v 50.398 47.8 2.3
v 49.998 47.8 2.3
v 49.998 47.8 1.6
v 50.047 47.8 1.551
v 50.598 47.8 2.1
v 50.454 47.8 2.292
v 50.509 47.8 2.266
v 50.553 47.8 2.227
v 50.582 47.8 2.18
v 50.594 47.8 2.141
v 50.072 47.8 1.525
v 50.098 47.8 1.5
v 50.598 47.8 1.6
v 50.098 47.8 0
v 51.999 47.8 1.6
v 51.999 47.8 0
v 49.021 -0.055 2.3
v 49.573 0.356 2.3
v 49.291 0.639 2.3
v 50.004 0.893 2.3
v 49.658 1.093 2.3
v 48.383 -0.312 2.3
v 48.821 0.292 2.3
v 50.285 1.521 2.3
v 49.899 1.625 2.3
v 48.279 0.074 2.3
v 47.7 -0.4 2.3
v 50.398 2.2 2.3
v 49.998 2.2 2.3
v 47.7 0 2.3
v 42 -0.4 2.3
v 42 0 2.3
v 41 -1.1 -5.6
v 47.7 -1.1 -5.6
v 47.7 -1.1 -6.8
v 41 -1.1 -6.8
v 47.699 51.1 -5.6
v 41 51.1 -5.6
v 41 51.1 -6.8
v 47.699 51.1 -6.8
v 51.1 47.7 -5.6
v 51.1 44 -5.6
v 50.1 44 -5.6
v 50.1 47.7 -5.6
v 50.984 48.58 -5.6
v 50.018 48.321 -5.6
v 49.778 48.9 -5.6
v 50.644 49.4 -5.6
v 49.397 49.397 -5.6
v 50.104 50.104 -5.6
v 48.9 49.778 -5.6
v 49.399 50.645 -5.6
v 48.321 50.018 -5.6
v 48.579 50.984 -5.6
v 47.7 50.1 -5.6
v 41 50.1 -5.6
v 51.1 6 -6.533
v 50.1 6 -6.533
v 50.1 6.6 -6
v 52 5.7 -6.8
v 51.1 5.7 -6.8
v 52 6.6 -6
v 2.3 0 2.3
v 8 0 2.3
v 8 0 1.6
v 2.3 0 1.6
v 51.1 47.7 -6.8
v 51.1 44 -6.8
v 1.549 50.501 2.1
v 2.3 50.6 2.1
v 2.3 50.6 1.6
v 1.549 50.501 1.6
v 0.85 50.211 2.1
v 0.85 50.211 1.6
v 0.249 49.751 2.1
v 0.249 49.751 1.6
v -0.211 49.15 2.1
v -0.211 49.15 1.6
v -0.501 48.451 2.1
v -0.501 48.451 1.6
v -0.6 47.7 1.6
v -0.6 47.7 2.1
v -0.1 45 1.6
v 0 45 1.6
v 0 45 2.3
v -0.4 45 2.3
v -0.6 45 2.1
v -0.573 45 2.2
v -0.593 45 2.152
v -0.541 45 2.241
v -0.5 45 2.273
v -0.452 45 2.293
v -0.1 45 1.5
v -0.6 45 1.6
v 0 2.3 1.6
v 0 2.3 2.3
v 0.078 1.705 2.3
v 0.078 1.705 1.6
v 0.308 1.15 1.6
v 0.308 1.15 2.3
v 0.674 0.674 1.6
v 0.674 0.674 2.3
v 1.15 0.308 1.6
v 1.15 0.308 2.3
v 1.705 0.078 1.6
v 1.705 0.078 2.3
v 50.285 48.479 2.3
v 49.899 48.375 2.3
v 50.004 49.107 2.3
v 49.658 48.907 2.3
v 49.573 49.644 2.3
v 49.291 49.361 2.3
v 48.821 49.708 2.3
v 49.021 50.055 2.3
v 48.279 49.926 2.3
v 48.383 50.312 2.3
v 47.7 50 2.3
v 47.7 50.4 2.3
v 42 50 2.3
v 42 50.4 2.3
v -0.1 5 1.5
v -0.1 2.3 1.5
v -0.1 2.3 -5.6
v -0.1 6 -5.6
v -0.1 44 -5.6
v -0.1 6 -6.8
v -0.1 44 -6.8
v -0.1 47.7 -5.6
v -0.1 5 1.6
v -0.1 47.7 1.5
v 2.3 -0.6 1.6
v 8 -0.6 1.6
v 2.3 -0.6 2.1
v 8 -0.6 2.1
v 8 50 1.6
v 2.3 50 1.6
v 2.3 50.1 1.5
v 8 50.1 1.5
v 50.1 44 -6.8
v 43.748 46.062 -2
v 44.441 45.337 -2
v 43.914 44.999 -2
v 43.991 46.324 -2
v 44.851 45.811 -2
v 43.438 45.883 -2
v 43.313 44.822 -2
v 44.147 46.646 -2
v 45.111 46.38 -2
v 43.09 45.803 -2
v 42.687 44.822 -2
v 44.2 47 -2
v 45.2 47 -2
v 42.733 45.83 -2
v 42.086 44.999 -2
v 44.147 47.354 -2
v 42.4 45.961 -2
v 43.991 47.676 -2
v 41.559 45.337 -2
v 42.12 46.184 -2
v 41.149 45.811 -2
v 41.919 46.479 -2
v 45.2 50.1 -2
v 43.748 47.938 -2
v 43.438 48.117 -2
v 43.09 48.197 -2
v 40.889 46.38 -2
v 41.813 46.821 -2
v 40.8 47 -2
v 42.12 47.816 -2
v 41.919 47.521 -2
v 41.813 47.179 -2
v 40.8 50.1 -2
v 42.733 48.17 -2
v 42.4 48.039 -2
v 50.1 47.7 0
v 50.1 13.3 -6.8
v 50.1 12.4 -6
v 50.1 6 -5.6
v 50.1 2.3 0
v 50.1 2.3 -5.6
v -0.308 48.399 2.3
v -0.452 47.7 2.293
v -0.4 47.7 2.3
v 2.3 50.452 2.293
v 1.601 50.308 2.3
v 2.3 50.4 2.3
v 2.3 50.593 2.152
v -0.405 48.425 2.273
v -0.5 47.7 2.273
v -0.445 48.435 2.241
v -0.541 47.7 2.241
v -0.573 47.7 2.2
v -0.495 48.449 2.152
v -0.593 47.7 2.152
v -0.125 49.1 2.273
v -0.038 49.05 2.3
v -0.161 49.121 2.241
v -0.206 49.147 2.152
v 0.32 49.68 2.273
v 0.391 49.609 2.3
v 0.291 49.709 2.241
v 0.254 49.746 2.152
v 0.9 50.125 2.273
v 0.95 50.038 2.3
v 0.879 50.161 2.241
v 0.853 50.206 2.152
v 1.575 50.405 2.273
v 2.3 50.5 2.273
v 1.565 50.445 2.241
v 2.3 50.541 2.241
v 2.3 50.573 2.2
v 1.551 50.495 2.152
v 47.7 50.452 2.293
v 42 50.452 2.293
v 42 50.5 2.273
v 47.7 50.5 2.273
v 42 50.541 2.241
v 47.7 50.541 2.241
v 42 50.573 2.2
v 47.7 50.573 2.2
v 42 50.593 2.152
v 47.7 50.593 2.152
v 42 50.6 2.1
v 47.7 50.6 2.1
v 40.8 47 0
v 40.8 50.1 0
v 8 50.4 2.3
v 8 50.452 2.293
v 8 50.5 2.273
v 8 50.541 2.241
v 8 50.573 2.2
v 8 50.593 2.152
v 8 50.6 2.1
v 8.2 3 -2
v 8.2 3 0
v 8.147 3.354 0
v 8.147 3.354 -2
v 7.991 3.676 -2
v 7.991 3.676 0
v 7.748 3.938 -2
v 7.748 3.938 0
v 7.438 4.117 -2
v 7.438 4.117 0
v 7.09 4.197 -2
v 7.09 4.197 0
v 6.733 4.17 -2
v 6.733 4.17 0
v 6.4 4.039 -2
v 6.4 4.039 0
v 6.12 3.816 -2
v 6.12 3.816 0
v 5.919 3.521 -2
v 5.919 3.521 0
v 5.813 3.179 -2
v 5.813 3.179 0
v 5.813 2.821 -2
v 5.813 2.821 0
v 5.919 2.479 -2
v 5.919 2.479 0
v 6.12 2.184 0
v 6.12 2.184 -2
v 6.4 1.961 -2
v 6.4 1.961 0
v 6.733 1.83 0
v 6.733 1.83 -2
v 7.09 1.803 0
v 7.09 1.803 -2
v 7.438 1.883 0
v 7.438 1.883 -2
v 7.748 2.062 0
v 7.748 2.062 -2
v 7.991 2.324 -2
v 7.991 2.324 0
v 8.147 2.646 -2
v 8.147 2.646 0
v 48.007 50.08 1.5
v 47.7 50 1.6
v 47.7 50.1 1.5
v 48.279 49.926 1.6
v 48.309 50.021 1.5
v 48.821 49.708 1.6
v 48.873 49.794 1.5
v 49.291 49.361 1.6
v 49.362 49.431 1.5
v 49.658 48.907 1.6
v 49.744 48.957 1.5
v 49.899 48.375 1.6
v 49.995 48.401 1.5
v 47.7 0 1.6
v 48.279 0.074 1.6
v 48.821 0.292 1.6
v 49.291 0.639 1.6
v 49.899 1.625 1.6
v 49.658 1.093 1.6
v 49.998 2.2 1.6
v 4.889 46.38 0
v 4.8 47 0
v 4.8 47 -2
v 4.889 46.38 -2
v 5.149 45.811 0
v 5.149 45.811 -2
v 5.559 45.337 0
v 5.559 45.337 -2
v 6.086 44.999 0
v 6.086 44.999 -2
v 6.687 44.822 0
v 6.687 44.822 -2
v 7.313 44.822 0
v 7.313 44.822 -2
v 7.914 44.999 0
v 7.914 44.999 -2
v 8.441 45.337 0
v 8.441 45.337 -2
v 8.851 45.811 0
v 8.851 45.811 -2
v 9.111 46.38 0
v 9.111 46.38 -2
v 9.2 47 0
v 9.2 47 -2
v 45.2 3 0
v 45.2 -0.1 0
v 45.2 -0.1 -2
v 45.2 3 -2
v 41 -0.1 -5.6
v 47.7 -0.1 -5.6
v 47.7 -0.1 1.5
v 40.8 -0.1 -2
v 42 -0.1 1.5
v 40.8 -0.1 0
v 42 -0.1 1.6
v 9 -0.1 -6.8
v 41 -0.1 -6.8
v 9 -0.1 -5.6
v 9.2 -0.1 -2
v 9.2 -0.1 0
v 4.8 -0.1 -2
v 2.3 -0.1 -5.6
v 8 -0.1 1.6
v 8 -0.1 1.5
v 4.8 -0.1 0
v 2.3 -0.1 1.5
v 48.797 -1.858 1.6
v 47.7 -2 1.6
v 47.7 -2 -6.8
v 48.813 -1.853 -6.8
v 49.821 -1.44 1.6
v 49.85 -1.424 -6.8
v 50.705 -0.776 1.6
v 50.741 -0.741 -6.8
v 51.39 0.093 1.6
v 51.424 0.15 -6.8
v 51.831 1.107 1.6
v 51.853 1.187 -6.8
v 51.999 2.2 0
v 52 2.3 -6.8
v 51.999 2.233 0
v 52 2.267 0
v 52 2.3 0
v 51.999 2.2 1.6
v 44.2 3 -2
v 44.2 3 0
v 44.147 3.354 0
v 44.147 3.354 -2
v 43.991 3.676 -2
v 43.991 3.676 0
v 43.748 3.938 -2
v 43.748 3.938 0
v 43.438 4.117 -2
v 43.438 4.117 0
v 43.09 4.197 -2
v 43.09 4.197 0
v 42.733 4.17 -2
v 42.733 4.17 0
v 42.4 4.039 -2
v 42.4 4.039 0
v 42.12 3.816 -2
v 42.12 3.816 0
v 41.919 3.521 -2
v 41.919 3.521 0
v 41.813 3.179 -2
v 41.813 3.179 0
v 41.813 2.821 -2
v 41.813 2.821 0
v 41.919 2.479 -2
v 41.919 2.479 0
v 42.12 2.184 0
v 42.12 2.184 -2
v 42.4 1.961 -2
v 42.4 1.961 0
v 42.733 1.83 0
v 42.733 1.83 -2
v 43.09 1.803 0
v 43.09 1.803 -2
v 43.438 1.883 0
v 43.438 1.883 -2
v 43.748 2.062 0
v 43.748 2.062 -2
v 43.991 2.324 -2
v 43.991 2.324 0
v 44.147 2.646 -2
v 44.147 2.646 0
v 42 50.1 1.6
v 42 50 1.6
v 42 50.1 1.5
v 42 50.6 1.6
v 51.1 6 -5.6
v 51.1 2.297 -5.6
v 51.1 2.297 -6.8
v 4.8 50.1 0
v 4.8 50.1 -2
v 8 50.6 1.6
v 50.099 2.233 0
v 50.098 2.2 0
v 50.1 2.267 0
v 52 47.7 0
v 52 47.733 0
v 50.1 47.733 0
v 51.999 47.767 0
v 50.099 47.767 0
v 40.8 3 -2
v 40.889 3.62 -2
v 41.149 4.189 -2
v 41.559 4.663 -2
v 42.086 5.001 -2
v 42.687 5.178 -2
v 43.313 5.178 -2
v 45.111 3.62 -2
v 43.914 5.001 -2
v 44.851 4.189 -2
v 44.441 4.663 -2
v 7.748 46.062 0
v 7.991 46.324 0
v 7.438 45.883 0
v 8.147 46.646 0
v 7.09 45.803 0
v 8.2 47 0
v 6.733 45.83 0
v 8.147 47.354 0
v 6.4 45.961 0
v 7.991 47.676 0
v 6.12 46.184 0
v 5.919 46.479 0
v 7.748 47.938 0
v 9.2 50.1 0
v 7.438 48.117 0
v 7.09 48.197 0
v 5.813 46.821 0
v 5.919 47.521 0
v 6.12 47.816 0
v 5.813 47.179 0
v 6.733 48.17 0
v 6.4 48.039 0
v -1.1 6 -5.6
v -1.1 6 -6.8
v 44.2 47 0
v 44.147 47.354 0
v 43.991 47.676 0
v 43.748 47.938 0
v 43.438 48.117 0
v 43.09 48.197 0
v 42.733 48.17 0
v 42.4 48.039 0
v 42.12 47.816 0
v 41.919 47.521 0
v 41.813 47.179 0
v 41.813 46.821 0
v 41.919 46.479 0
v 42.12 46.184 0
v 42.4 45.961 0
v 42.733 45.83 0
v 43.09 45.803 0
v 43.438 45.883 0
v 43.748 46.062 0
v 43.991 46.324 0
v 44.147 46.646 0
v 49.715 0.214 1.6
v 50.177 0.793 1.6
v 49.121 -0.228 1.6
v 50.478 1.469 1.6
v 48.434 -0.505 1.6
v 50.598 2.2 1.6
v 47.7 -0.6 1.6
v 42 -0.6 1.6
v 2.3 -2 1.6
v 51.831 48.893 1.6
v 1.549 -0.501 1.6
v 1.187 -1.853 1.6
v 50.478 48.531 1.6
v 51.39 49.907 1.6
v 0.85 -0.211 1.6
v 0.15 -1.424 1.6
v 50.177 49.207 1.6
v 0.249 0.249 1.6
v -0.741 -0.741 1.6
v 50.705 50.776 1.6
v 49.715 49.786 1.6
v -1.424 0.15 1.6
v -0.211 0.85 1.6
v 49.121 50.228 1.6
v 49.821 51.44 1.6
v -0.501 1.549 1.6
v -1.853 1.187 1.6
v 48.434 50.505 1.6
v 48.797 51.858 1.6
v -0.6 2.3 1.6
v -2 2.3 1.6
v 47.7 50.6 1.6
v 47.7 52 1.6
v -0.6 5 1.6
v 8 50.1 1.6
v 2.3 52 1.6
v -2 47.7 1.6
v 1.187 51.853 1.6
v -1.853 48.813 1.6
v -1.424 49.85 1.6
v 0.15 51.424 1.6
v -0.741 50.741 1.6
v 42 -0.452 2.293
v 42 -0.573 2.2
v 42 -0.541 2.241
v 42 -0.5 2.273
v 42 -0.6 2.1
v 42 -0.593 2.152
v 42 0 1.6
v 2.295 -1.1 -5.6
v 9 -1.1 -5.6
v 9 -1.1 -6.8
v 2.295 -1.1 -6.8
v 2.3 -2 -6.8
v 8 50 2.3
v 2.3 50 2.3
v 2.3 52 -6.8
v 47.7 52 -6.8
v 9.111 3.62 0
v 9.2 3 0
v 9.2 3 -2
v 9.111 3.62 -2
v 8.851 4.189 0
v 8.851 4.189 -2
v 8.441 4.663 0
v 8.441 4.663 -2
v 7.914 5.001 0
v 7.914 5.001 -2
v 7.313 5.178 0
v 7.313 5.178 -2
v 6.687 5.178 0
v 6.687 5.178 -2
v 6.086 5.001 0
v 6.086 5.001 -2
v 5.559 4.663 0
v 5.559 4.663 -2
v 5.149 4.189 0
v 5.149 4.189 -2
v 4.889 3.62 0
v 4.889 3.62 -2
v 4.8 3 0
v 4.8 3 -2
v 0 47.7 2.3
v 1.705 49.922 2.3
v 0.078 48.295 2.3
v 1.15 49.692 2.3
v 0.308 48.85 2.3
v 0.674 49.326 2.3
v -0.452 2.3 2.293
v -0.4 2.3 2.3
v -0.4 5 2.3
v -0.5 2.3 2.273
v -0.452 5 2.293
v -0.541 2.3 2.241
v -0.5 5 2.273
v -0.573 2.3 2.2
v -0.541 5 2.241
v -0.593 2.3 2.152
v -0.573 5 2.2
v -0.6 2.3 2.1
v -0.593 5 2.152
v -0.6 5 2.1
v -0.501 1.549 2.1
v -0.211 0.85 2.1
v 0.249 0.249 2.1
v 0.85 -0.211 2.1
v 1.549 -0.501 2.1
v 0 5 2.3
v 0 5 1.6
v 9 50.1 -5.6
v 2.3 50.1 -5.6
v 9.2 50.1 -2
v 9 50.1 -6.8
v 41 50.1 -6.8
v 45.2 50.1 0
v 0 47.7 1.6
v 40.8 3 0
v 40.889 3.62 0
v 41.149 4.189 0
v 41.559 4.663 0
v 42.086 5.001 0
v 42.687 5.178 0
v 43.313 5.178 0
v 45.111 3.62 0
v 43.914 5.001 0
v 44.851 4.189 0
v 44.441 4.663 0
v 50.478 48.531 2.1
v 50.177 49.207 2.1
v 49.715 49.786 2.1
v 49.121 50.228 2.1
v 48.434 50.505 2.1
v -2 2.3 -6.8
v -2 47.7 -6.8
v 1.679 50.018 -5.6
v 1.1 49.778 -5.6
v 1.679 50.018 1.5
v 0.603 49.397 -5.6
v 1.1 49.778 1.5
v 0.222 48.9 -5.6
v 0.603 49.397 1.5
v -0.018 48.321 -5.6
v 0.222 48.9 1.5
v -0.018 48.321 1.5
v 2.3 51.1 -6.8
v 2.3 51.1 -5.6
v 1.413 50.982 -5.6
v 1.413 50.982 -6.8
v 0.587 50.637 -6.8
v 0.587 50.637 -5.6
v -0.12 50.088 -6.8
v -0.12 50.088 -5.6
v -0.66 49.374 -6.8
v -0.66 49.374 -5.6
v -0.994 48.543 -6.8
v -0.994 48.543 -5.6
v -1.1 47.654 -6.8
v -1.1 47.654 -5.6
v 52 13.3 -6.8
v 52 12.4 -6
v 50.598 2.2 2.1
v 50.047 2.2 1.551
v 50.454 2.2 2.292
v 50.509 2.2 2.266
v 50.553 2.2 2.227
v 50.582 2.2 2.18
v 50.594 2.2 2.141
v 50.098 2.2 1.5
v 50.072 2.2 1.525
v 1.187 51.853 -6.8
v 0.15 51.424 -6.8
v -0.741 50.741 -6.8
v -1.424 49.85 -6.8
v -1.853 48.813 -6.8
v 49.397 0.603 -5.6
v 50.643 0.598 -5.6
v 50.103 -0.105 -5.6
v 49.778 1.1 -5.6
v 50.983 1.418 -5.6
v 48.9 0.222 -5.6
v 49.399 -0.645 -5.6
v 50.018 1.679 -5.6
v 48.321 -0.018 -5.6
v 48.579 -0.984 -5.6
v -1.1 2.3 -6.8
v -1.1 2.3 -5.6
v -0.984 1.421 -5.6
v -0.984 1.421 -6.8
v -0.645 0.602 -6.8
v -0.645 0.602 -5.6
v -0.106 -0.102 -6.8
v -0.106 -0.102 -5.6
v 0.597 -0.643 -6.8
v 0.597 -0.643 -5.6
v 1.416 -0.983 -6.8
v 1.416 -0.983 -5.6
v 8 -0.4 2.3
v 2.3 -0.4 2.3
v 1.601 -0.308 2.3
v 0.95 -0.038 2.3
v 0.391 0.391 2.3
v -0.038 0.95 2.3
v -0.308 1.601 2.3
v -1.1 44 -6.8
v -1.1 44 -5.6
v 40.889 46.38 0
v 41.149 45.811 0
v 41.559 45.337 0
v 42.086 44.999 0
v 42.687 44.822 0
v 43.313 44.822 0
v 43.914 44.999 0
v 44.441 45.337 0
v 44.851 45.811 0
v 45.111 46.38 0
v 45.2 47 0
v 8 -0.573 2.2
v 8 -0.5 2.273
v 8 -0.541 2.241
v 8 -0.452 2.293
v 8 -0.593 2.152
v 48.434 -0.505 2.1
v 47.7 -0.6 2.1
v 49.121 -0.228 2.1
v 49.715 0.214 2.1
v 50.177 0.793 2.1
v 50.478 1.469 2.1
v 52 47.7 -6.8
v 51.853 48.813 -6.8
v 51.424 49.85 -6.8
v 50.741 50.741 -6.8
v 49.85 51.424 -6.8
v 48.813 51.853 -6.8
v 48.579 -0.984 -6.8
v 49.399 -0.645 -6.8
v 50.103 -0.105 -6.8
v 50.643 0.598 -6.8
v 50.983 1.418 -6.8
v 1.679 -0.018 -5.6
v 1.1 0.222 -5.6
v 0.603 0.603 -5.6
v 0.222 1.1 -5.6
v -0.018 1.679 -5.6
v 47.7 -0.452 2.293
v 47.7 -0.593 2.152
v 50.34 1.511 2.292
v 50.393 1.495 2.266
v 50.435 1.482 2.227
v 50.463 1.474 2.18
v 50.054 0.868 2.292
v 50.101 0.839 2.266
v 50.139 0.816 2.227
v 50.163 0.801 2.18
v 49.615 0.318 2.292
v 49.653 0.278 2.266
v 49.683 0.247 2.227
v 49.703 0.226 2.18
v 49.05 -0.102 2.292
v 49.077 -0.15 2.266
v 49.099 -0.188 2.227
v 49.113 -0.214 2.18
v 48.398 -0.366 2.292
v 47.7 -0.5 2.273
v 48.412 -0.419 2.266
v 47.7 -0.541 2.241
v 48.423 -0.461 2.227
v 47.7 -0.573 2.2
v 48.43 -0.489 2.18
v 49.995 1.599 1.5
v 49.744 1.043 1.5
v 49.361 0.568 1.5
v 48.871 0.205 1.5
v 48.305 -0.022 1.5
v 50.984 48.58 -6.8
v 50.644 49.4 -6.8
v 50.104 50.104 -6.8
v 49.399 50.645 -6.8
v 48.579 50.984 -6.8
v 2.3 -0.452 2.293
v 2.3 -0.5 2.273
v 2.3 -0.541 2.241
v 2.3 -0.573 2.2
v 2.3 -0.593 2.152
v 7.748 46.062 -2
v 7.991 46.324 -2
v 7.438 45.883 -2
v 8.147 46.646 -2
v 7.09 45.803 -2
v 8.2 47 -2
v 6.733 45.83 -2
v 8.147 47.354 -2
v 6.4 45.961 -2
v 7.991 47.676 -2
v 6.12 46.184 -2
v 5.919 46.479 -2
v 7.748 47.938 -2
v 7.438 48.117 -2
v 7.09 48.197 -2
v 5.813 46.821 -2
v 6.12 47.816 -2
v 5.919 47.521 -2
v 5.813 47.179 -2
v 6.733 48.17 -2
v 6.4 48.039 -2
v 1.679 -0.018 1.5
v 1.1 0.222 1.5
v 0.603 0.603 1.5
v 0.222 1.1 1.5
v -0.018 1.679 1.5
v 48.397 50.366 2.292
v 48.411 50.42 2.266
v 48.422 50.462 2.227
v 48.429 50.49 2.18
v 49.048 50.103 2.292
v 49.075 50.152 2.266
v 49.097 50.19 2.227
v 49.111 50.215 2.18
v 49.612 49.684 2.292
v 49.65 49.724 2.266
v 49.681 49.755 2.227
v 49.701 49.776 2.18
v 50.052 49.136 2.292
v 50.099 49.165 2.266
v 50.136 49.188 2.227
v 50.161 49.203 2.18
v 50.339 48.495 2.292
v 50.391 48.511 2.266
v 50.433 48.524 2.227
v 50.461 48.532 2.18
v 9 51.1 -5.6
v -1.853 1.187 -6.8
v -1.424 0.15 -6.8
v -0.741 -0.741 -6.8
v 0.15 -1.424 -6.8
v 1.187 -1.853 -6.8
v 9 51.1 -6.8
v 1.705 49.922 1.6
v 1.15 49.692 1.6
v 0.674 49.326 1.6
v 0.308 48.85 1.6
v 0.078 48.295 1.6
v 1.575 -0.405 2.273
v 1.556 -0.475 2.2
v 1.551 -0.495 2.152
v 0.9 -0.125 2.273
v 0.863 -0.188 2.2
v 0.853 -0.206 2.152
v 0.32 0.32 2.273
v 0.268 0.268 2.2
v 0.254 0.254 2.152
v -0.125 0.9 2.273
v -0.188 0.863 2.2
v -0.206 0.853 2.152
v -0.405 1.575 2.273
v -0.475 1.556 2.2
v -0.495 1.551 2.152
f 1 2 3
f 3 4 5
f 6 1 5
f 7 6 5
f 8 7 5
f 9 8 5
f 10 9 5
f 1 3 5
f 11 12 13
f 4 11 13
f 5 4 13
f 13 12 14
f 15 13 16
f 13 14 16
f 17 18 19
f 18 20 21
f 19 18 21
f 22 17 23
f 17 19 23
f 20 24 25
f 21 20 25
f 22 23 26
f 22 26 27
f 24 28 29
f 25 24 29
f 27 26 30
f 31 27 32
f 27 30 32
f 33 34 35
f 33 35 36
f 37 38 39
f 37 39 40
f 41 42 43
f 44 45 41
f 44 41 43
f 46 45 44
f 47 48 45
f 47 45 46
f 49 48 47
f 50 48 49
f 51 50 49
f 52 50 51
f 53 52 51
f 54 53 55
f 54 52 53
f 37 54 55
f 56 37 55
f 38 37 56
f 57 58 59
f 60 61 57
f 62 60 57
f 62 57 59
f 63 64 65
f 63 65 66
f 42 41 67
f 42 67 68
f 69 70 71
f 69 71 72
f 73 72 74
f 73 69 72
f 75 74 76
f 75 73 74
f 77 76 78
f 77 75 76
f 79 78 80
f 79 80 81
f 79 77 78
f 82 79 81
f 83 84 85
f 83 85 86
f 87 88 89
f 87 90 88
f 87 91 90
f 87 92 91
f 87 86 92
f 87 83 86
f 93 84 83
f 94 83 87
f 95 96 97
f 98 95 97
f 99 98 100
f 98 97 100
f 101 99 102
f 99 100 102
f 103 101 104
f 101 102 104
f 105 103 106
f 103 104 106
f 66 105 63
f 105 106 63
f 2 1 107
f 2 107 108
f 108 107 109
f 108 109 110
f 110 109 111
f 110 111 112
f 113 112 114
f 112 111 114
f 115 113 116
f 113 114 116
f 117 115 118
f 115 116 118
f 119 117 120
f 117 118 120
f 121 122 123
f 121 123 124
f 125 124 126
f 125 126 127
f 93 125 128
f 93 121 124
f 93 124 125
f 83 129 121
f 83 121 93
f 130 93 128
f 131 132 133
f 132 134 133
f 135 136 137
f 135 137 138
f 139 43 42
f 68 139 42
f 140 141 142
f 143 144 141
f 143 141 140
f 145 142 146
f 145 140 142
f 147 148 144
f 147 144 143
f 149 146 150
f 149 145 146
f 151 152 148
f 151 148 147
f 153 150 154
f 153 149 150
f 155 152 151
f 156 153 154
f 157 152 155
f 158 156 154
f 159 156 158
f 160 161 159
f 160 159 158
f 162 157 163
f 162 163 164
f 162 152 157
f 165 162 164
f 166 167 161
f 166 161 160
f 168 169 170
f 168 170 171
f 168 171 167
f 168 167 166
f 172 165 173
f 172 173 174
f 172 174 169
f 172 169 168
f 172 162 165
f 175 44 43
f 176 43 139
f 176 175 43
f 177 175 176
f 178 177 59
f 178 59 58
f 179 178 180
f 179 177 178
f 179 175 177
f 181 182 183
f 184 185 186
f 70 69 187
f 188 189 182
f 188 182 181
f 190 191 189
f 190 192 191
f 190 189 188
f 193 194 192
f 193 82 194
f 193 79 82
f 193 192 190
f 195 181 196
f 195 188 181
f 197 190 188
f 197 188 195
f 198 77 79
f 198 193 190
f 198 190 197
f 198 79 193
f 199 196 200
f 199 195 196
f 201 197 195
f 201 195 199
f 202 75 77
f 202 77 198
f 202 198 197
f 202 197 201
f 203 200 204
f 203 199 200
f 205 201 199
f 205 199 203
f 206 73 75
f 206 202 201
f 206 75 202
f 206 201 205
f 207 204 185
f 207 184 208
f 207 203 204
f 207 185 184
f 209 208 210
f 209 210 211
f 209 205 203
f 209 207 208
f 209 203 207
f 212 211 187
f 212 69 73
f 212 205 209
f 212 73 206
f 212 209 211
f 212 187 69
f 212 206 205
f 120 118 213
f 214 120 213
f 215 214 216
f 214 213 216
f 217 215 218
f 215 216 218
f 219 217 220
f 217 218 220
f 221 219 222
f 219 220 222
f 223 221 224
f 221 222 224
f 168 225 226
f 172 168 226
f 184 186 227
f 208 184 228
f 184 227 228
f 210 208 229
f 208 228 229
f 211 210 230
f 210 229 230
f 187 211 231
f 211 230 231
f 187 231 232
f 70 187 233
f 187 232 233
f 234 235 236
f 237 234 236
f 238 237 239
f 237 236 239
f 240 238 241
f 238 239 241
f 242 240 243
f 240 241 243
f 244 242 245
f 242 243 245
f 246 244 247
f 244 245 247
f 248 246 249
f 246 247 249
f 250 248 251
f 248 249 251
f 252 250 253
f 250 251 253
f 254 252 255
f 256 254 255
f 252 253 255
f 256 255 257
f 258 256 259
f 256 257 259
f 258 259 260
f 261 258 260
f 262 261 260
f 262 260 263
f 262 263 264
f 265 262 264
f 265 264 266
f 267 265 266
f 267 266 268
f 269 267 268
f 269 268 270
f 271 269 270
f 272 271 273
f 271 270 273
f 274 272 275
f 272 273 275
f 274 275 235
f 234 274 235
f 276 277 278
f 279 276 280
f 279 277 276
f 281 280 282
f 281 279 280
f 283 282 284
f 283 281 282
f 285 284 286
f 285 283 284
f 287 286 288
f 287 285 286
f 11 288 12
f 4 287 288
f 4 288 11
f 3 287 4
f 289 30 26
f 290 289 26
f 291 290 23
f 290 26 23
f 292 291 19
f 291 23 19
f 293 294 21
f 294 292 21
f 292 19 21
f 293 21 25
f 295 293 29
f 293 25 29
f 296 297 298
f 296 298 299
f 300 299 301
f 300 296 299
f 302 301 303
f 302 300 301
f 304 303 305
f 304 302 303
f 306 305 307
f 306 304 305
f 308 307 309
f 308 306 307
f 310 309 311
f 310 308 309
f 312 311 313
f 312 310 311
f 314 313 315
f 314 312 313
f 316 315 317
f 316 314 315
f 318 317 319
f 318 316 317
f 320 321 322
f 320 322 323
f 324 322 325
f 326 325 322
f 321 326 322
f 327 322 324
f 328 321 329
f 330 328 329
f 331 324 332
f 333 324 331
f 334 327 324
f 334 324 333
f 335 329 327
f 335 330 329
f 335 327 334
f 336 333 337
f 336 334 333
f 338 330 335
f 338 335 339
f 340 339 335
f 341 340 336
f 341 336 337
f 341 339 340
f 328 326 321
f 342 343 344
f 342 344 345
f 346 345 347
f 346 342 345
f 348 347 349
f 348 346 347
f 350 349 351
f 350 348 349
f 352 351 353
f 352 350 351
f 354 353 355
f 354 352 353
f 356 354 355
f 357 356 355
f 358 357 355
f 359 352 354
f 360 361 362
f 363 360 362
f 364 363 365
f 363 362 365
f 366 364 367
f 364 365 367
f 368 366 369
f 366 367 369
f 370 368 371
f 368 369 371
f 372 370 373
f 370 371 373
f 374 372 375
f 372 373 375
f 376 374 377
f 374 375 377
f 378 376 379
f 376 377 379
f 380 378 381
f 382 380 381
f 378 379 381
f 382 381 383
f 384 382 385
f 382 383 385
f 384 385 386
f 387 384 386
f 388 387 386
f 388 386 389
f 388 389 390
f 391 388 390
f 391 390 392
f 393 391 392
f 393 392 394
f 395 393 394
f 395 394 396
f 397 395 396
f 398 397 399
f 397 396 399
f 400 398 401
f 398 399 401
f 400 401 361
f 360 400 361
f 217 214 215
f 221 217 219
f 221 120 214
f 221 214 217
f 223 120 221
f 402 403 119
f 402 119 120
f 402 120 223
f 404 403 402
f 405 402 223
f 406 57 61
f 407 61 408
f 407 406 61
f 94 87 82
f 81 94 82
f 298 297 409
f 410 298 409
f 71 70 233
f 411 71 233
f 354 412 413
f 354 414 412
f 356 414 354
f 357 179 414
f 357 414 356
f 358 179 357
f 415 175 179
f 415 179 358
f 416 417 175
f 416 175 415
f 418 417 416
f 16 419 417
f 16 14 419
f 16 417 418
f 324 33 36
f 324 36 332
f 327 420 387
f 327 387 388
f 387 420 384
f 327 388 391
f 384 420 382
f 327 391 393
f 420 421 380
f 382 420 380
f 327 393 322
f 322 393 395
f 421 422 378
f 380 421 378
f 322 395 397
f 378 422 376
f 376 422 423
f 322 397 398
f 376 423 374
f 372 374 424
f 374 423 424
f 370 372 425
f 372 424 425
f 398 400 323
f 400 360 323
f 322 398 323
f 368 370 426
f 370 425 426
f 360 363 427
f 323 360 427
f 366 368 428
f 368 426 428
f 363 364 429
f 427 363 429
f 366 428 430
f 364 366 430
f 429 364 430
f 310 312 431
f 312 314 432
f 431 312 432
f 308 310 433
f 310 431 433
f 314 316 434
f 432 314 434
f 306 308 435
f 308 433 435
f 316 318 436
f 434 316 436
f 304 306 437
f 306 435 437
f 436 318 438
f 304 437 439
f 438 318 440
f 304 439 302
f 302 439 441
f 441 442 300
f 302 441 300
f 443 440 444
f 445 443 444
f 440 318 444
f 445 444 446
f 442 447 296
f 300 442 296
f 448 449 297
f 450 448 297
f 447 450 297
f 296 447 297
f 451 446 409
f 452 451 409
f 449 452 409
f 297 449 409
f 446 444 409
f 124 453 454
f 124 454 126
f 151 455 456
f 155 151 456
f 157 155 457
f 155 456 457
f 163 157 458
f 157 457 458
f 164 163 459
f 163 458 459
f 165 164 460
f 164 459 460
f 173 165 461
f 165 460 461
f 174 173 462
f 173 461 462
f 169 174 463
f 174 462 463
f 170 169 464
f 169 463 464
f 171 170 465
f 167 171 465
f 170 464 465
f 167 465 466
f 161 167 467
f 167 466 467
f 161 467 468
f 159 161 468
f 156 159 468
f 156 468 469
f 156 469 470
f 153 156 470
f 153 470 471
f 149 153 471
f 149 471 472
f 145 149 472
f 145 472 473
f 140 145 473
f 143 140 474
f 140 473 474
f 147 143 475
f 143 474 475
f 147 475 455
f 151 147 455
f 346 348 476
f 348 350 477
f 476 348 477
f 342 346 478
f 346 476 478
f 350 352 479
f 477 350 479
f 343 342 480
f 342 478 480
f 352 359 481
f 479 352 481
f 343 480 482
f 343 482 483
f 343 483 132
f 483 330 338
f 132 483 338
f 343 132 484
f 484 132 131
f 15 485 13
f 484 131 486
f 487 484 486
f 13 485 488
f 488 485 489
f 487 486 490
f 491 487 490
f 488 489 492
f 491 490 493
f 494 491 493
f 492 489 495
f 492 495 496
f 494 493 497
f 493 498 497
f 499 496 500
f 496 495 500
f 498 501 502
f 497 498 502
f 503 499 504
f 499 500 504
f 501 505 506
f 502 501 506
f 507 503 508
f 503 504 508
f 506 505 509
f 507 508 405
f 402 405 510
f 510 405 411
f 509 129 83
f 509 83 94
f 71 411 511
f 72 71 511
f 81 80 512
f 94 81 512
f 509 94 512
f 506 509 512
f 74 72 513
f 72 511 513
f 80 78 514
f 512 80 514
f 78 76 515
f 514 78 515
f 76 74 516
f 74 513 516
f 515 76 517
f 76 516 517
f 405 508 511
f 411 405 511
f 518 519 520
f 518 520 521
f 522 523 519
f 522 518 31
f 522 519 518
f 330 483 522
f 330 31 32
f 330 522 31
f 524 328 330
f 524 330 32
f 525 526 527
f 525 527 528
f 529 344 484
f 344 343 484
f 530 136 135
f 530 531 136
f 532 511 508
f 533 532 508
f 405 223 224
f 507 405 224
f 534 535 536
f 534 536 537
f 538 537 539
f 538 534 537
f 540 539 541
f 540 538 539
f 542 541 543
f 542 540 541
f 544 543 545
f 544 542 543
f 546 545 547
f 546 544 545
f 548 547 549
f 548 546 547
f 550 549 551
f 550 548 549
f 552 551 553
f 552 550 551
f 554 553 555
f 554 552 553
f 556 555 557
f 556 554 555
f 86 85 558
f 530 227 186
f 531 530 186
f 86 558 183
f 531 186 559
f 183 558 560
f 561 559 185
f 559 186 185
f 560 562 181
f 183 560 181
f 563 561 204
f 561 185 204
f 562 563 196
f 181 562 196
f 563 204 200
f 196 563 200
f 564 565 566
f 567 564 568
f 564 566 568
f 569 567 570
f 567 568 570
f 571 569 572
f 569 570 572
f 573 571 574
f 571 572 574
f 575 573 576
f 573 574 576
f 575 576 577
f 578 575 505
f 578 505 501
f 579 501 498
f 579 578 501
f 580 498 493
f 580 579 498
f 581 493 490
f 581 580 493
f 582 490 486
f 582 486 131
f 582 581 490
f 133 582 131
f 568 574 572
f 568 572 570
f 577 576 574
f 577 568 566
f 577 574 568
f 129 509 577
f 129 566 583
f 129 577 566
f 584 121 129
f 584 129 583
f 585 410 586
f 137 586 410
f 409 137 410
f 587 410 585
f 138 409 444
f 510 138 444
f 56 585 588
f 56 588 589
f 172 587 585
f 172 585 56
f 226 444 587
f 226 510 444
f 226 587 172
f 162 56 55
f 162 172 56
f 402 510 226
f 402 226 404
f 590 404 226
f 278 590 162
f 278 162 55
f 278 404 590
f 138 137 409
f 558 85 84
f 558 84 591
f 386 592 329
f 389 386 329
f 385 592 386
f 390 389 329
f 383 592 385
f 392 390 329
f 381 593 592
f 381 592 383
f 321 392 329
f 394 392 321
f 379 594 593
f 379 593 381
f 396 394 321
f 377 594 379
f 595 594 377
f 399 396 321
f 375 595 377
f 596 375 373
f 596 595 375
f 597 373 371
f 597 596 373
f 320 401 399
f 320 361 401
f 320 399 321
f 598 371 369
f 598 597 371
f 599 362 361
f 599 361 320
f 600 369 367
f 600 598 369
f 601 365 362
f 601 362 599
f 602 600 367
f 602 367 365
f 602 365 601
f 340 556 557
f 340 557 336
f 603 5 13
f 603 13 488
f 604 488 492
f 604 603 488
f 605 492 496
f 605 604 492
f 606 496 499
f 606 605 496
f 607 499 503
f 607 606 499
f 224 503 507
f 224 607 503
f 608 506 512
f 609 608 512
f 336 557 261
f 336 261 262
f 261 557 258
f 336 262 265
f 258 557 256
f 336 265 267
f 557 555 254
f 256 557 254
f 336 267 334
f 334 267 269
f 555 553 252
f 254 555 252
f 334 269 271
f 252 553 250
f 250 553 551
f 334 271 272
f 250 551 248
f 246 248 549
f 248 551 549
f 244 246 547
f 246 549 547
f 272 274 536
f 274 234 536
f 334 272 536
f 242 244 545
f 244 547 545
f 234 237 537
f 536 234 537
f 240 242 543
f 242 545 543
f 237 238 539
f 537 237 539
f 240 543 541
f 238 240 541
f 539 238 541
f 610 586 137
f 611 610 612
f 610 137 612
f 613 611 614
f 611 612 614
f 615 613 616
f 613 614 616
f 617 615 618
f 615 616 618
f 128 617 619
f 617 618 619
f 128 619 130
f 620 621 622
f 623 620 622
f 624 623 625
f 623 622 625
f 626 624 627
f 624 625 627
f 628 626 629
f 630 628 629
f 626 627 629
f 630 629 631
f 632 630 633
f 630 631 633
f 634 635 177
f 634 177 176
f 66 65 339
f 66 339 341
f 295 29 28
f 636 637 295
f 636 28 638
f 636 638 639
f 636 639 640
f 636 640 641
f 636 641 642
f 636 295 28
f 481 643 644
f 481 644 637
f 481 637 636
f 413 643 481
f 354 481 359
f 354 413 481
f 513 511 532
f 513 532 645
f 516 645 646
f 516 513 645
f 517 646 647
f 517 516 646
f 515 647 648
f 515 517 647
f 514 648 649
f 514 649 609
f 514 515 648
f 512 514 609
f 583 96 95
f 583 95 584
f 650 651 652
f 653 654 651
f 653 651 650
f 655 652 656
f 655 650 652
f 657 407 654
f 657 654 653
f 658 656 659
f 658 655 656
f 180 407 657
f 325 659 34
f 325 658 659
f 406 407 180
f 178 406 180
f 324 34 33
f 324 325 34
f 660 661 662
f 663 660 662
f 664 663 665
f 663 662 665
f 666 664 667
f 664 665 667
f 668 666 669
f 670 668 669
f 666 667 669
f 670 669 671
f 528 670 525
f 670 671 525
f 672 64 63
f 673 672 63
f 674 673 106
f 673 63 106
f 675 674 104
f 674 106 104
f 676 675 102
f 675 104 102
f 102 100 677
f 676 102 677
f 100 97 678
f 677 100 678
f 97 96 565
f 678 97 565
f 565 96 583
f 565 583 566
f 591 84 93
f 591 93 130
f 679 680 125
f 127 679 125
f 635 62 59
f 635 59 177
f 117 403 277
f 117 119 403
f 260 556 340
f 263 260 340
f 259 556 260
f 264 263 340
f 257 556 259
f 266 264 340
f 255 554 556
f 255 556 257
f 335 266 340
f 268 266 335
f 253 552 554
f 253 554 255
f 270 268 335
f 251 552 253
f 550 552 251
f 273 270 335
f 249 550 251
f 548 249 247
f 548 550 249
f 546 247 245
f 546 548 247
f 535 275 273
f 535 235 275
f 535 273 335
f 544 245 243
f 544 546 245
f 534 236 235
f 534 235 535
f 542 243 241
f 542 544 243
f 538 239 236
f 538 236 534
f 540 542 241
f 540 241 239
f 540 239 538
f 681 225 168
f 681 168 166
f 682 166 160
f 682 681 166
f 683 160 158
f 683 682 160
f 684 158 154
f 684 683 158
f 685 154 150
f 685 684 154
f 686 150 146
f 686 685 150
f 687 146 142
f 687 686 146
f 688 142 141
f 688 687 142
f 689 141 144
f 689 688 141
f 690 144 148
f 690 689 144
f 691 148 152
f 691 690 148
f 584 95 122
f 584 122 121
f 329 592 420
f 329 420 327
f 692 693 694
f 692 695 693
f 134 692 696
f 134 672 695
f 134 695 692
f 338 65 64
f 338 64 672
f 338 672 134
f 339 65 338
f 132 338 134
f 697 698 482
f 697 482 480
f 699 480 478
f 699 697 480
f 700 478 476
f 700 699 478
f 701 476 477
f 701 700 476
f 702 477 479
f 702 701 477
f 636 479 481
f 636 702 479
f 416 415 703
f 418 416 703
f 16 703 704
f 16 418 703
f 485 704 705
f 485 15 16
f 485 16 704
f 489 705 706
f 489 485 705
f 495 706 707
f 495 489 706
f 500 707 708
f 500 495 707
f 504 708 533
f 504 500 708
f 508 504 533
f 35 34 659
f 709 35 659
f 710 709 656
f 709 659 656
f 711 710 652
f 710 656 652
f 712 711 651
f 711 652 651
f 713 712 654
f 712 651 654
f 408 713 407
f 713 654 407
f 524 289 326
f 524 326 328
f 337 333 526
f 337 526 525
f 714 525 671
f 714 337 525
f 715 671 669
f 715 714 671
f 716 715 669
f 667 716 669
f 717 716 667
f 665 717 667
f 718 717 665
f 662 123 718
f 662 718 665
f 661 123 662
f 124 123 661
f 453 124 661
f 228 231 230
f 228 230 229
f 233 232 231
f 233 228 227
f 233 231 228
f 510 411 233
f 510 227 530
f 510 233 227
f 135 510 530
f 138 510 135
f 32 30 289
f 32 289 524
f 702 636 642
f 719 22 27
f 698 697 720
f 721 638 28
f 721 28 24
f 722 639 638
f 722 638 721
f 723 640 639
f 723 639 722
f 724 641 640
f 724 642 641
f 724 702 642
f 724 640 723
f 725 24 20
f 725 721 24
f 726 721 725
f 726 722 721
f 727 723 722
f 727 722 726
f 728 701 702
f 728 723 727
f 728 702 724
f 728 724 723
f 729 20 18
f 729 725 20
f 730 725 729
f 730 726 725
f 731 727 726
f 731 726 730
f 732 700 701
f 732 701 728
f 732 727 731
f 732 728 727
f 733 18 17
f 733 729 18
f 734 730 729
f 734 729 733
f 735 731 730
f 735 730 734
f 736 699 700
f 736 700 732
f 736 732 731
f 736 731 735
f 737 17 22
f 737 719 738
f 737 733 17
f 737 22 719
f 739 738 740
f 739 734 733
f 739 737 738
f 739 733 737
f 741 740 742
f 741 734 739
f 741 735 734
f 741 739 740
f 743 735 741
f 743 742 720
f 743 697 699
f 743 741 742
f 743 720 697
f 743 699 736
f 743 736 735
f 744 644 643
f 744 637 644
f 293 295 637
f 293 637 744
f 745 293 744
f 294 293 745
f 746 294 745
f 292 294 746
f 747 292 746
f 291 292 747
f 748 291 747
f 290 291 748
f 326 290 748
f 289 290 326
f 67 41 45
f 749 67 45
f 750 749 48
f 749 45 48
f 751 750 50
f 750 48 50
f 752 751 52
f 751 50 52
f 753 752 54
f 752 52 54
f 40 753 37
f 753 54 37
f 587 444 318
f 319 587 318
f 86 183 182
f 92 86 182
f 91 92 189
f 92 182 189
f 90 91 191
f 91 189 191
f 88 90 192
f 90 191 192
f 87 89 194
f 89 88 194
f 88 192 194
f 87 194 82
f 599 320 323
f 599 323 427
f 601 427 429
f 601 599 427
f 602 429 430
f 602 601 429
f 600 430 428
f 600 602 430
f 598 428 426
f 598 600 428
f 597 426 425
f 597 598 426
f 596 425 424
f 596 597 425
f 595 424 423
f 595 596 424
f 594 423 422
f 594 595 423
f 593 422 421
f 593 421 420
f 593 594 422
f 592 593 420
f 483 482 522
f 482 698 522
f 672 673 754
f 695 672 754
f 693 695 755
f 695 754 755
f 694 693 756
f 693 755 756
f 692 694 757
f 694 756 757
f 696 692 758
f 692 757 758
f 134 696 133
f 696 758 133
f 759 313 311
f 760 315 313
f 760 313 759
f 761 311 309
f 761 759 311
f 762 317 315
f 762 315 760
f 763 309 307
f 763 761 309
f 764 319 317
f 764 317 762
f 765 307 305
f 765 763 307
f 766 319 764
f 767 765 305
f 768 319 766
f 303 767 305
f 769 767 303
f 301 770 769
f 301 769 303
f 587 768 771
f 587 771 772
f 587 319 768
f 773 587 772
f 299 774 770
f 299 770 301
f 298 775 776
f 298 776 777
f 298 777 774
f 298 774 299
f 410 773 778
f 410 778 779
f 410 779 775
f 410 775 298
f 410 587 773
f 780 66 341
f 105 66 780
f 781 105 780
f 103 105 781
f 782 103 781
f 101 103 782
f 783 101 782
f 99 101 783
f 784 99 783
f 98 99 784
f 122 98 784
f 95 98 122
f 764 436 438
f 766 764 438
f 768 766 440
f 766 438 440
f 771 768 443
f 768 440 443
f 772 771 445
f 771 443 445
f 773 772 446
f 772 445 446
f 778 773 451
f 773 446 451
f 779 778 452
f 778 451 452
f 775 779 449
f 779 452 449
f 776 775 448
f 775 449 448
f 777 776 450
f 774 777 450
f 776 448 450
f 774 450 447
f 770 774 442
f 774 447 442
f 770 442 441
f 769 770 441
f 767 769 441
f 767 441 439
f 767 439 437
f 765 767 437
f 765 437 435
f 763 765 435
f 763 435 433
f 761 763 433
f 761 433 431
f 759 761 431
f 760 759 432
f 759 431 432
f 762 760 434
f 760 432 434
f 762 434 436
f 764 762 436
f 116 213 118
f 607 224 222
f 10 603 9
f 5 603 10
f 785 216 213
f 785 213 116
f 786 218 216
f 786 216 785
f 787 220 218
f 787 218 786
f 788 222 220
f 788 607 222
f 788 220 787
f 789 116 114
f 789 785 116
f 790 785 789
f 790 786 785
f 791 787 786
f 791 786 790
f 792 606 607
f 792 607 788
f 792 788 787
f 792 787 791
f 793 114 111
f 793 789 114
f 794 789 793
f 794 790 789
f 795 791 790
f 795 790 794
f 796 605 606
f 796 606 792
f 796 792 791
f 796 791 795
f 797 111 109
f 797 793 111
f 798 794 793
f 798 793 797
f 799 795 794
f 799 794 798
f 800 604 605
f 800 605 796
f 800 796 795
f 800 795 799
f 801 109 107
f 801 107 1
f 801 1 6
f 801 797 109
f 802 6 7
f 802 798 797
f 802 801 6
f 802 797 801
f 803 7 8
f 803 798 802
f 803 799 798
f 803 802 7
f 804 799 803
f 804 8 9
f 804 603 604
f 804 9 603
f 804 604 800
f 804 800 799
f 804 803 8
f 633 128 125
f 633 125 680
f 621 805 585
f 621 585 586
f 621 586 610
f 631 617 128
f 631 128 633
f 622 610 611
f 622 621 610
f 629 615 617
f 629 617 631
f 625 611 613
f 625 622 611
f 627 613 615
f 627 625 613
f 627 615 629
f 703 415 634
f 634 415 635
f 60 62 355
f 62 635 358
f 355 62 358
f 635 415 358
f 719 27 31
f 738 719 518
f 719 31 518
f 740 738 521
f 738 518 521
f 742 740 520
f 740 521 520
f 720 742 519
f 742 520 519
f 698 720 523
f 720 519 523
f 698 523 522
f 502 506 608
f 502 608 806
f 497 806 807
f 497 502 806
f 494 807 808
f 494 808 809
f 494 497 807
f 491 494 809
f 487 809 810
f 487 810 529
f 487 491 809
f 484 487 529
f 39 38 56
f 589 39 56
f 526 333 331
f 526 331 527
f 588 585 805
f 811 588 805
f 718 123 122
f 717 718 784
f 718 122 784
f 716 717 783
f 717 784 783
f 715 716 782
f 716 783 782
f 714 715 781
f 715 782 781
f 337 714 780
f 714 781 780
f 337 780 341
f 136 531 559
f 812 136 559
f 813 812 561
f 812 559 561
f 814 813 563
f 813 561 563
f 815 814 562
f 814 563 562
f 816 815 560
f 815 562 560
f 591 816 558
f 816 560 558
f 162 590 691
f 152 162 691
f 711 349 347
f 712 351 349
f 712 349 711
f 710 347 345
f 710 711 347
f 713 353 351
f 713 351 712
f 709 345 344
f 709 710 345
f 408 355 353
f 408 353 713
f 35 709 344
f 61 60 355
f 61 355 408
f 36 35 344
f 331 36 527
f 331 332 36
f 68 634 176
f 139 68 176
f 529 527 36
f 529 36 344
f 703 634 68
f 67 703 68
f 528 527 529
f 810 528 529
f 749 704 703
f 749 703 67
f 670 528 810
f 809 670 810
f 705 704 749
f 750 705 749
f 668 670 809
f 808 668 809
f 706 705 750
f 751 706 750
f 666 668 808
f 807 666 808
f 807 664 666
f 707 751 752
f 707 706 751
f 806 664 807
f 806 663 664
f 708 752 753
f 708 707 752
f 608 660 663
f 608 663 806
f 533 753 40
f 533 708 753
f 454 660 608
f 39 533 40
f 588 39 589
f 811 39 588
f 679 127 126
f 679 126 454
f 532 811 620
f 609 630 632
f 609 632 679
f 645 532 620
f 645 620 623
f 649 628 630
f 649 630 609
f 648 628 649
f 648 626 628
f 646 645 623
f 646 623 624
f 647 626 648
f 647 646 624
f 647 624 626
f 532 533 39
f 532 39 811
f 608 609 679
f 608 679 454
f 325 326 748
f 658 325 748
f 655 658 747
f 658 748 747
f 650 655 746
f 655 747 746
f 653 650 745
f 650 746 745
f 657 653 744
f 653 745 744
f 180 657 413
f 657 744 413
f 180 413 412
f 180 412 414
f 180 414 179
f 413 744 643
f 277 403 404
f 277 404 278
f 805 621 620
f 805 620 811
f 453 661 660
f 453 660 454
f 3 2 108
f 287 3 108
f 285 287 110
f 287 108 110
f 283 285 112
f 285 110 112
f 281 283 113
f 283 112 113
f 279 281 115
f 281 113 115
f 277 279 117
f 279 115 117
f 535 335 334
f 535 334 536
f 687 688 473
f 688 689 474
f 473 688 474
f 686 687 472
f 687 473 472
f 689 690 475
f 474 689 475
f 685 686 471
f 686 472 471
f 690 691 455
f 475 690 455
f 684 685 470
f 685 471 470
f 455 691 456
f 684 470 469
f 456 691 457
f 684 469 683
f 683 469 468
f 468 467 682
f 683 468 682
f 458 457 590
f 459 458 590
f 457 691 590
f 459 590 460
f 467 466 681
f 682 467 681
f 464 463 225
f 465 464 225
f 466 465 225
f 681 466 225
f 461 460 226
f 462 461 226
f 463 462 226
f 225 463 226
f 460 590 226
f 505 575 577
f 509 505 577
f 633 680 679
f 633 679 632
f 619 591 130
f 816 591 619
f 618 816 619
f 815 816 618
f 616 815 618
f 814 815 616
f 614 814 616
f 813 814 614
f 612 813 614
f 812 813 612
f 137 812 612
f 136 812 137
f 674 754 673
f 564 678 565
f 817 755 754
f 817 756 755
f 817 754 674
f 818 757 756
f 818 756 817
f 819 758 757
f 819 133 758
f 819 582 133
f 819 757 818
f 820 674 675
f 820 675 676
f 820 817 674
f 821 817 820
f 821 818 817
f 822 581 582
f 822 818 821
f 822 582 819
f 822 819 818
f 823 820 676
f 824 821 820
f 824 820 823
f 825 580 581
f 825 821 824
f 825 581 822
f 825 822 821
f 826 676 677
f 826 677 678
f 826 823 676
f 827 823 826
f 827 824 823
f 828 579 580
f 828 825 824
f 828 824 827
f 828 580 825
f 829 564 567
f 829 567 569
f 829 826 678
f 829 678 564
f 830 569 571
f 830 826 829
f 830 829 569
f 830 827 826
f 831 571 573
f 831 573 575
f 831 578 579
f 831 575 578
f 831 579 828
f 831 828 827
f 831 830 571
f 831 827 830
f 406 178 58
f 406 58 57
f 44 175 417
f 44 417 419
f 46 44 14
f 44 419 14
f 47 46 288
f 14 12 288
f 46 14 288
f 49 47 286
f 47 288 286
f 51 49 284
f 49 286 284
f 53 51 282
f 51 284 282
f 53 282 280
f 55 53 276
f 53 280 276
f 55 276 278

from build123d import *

# Parameters (mm, degrees)
EXTRUDE006_DEPTH                     = 2
EXTRUDE006_ONTO_SKETCH006_ROLL_ANGLE = 90
EXTRUDE006_PLACEMENT_ANGLE           = 90
SKETCH_W                             = 14.047477
SKETCH_H                             = 45.6
EXTRUDE004_DEPTH                     = 10
SKETCH002_R                          = 1.2
EXTRUDE001_DEPTH                     = 2
EXTRUDE005_DEPTH                     = 10
EXTRUDE003_DEPTH                     = 0.7
EXTRUDE003_DEPTH_BACK                = 0.2
FILLET_R                             = 0.2
CHAMFER_SIZE                         = 0.2
EXTRUDE002_DEPTH                     = 2
EXTRUDE_DEPTH                        = 1.6
EXTRUDE_DEPTH_BACK                   = 6.8


with BuildPart() as extrude006:
    # Sketch006 as drawn → Extrude006 (new, symmetric)
    with BuildSketch(Plane.XY):
        Polygon((-3.8, 0), (-2.9, 0.8), (2.9, 0.8), (3.8, 0), align=None)
    extrude(amount=EXTRUDE006_DEPTH, both=True)


with BuildPart() as extrude006_1:
    # Extrude006 onto Sketch006 roll: moved
    add(extrude006.part.rotate(Axis((0, 0, 0), (1, 0, 0)), EXTRUDE006_ONTO_SKETCH006_ROLL_ANGLE))


with BuildPart() as extrude006_2:
    # Extrude006 onto Sketch006 placement: moved
    add(extrude006_1.part)


with BuildPart() as extrude006_3:
    # Extrude006 placement: moved
    add(extrude006_2.part.moved(Location((50, 9.5, -6.8))).rotate(Axis((50, 9.5, -6.8), (0, 0, 1)), EXTRUDE006_PLACEMENT_ANGLE))


with BuildPart() as extrude004:
    # Sketch → Extrude004 (new body)
    with BuildSketch(Plane.XY):
        with Locations((51.252235, 25)):
            Rectangle(SKETCH_W, SKETCH_H)
    extrude(amount=EXTRUDE004_DEPTH)


with BuildPart() as extrude001:
    # Sketch002 → Extrude001 (new body)
    with BuildSketch(Plane.XY):
        with BuildLine():
            Line((4.8, 47), (4.8, 51))
            Line((4.8, 51), (9.2, 51))
            Line((9.2, 51), (9.2, 47.000001))
            ThreePointArc((4.8, 47), (7, 44.8), (9.2, 47.000001))
        make_face()
        with Locations((7, 47)):
            Circle(SKETCH002_R, mode=Mode.SUBTRACT)
        with BuildLine():
            ThreePointArc((9.2, 3), (7, 5.2), (4.8, 3))
            Line((4.8, 3), (4.8, -1))
            Line((4.8, -1), (9.2, -1))
            Line((9.2, -1), (9.2, 3))
        make_face()
        with Locations((7, 3)):
            Circle(SKETCH002_R, mode=Mode.SUBTRACT)
        with BuildLine():
            Line((40.8, 47), (40.8, 51))
            Line((40.8, 51), (45.2, 51))
            Line((45.2, 51), (45.2, 46.999987))
            ThreePointArc((40.8, 47), (42.999993, 44.8), (45.2, 46.999987))
        make_face()
        with Locations((43, 47)):
            Circle(SKETCH002_R, mode=Mode.SUBTRACT)
        with BuildLine():
            ThreePointArc((45.2, 3), (43, 5.2), (40.8, 3))
            Line((40.8, 3), (40.8, -1))
            Line((40.8, -1), (45.2, -1))
            Line((45.2, -1), (45.2, 3))
        make_face()
        with Locations((43, 3)):
            Circle(SKETCH002_R, mode=Mode.SUBTRACT)
    extrude(amount=-EXTRUDE001_DEPTH)


with BuildPart() as extrude005:
    # Sketch005 → Extrude005 (new body)
    with BuildSketch(Plane.XY):
        Polygon((8, 53), (8, 45), (-3, 45), (-3, 5), (8, 5), (8, -3), (42, -3), (42, 5), (53, 5), (53, 45), (42, 45), (42, 53), align=None)
    extrude(amount=EXTRUDE005_DEPTH)


with BuildPart() as cut003:
    # Sketch004 → Extrude003 (new body, two sides)
    with BuildSketch(Plane.XY) as extrude003_sk:
        with BuildLine():
            Line((2.3, 50.6), (47.7, 50.6))
            ThreePointArc((50.6, 47.7), (49.75061, 49.75061), (47.7, 50.6))
            Line((50.6, 47.7), (50.6, 2.3))
            ThreePointArc((47.7, -0.6), (49.75061, 0.24939), (50.6, 2.3))
            Line((47.7, -0.6), (2.3, -0.6))
            ThreePointArc((-0.6, 2.3), (0.24939, 0.24939), (2.3, -0.6))
            Line((-0.6, 2.3), (-0.6, 47.7))
            ThreePointArc((2.3, 50.6), (0.24939, 49.75061), (-0.6, 47.7))
        make_face()
        with BuildLine():
            Line((2.3, 50), (47.7, 50))
            ThreePointArc((50, 47.7), (49.326346, 49.326346), (47.7, 50))
            Line((50, 47.7), (50, 2.3))
            ThreePointArc((47.7, 0), (49.326346, 0.673654), (50, 2.3))
            Line((47.7, 0), (2.3, 0))
            ThreePointArc((0, 2.3), (0.673654, 0.673654), (2.3, 0))
            Line((0, 2.3), (0, 47.7))
            ThreePointArc((2.3, 50), (0.673654, 49.326346), (0, 47.7))
        make_face(mode=Mode.SUBTRACT)
    extrude(amount=EXTRUDE003_DEPTH)
    extrude(extrude003_sk.sketch, amount=-EXTRUDE003_DEPTH_BACK)


with BuildPart() as cut003_1:
    # Extrude003 placement: moved
    add(cut003.part.moved(Location((0, 0, 1.6))))

    # Fillet
    fillet_edges = [cut003_1.edges().sort_by_distance(p)[0] for p in [
        (-0.6, 25, 2.3),
        (0.24939, 49.75061, 2.3),
        (25, 50.6, 2.3),
        (49.75061, 49.75061, 2.3),
        (50.6, 25, 2.3),
        (49.75061, 0.24939, 2.3),
        (25, -0.6, 2.3),
        (0.24939, 0.24939, 2.3),
    ]]
    fillet(fillet_edges, radius=FILLET_R)

    # Chamfer
    chamfer_edges = [cut003_1.edges().sort_by_distance(p)[0] for p in [
        (0, 25, 1.4),
        (0.673654, 49.326346, 1.4),
        (25, 50, 1.4),
        (49.326346, 49.326346, 1.4),
        (50, 25, 1.4),
        (49.326346, 0.673654, 1.4),
        (25, 0, 1.4),
        (0.673654, 0.673654, 1.4),
    ]]
    chamfer(chamfer_edges, length=CHAMFER_SIZE)

    # Cut003: cut Extrude005
    add(extrude005.part, mode=Mode.SUBTRACT)


with BuildPart() as extrude002:
    # Sketch003 → Extrude002 (new body)
    with BuildSketch(Plane.XY):
        with BuildLine():
            Line((2.3, 51.1), (9, 51.1))
            Line((9, 44), (9, 51.1))
            Line((-1.1, 44), (9, 44))
            Line((-1.1, 44), (-1.1, 47.654452))
            ThreePointArc((2.3, 51.1), (-0.12032, 50.088024), (-1.1, 47.654452))
        make_face()
        with BuildLine():
            Line((51.1, 47.699699), (51.1, 44))
            Line((41, 44), (51.1, 44))
            Line((41, 51.1), (41, 44))
            Line((41, 51.1), (47.698586, 51.1))
            ThreePointArc((51.1, 47.699699), (50.103681, 50.104468), (47.698586, 51.1))
        make_face()
        with BuildLine():
            Line((47.6997, -1.1), (41, -1.1))
            Line((41, -1.1), (41, 6))
            Line((41, 6), (51.1, 6))
            Line((51.1, 6), (51.1, 2.297304))
            ThreePointArc((47.6997, -1.1), (50.103016, -0.105134), (51.1, 2.297304))
        make_face()
        with BuildLine():
            Line((-1.1, 2.300296), (-1.1, 6))
            Line((-1.1, 6), (9, 6))
            Line((9, 6), (9, -1.1))
            Line((9, -1.1), (2.294563, -1.1))
            ThreePointArc((-1.1, 2.300296), (-0.106103, -0.10205), (2.294563, -1.1))
        make_face()
    extrude(amount=-EXTRUDE002_DEPTH)


with BuildPart() as extrude002_1:
    # Extrude002 placement: moved
    add(extrude002.part.moved(Location((0, 0, -5.6))))


with BuildPart() as cut004:
    # Sketch001 → Extrude (new body, two sides)
    with BuildSketch(Plane.XY) as extrude_sk:
        with BuildLine():
            Line((2.3, 52), (47.7, 52))
            ThreePointArc((52, 47.7), (50.740559, 50.740559), (47.7, 52))
            Line((52, 47.7), (52, 2.3))
            ThreePointArc((47.7, -2), (50.740559, -0.740559), (52, 2.3))
            Line((47.7, -2), (2.3, -2))
            ThreePointArc((-2, 2.3), (-0.740559, -0.740559), (2.3, -2))
            Line((-2, 2.3), (-2, 47.7))
            ThreePointArc((2.3, 52), (-0.740559, 50.740559), (-2, 47.7))
        make_face()
        with BuildLine():
            Line((2.3, 50.1), (47.7, 50.1))
            ThreePointArc((50.1, 47.7), (49.397056, 49.397056), (47.7, 50.1))
            Line((50.1, 47.7), (50.1, 2.3))
            ThreePointArc((47.7, -0.1), (49.397056, 0.602944), (50.1, 2.3))
            Line((47.7, -0.1), (2.3, -0.1))
            ThreePointArc((-0.1, 2.3), (0.602944, 0.602944), (2.3, -0.1))
            Line((-0.1, 2.3), (-0.1, 47.7))
            ThreePointArc((2.3, 50.1), (0.602944, 49.397056), (-0.1, 47.7))
        make_face(mode=Mode.SUBTRACT)
    extrude(amount=EXTRUDE_DEPTH)
    extrude(extrude_sk.sketch, amount=-EXTRUDE_DEPTH_BACK)

    # Cut002: cut Extrude002
    add(extrude002_1.part, mode=Mode.SUBTRACT)

    # Fusion001: union Cut003
    add(cut003_1.part)

    # Fusion002: union Extrude001
    add(extrude001.part)

    # Cut: cut Extrude004
    add(extrude004.part, mode=Mode.SUBTRACT)

    # Cut004: cut Extrude006
    add(extrude006_3.part, mode=Mode.SUBTRACT)


solid = cut004.part
